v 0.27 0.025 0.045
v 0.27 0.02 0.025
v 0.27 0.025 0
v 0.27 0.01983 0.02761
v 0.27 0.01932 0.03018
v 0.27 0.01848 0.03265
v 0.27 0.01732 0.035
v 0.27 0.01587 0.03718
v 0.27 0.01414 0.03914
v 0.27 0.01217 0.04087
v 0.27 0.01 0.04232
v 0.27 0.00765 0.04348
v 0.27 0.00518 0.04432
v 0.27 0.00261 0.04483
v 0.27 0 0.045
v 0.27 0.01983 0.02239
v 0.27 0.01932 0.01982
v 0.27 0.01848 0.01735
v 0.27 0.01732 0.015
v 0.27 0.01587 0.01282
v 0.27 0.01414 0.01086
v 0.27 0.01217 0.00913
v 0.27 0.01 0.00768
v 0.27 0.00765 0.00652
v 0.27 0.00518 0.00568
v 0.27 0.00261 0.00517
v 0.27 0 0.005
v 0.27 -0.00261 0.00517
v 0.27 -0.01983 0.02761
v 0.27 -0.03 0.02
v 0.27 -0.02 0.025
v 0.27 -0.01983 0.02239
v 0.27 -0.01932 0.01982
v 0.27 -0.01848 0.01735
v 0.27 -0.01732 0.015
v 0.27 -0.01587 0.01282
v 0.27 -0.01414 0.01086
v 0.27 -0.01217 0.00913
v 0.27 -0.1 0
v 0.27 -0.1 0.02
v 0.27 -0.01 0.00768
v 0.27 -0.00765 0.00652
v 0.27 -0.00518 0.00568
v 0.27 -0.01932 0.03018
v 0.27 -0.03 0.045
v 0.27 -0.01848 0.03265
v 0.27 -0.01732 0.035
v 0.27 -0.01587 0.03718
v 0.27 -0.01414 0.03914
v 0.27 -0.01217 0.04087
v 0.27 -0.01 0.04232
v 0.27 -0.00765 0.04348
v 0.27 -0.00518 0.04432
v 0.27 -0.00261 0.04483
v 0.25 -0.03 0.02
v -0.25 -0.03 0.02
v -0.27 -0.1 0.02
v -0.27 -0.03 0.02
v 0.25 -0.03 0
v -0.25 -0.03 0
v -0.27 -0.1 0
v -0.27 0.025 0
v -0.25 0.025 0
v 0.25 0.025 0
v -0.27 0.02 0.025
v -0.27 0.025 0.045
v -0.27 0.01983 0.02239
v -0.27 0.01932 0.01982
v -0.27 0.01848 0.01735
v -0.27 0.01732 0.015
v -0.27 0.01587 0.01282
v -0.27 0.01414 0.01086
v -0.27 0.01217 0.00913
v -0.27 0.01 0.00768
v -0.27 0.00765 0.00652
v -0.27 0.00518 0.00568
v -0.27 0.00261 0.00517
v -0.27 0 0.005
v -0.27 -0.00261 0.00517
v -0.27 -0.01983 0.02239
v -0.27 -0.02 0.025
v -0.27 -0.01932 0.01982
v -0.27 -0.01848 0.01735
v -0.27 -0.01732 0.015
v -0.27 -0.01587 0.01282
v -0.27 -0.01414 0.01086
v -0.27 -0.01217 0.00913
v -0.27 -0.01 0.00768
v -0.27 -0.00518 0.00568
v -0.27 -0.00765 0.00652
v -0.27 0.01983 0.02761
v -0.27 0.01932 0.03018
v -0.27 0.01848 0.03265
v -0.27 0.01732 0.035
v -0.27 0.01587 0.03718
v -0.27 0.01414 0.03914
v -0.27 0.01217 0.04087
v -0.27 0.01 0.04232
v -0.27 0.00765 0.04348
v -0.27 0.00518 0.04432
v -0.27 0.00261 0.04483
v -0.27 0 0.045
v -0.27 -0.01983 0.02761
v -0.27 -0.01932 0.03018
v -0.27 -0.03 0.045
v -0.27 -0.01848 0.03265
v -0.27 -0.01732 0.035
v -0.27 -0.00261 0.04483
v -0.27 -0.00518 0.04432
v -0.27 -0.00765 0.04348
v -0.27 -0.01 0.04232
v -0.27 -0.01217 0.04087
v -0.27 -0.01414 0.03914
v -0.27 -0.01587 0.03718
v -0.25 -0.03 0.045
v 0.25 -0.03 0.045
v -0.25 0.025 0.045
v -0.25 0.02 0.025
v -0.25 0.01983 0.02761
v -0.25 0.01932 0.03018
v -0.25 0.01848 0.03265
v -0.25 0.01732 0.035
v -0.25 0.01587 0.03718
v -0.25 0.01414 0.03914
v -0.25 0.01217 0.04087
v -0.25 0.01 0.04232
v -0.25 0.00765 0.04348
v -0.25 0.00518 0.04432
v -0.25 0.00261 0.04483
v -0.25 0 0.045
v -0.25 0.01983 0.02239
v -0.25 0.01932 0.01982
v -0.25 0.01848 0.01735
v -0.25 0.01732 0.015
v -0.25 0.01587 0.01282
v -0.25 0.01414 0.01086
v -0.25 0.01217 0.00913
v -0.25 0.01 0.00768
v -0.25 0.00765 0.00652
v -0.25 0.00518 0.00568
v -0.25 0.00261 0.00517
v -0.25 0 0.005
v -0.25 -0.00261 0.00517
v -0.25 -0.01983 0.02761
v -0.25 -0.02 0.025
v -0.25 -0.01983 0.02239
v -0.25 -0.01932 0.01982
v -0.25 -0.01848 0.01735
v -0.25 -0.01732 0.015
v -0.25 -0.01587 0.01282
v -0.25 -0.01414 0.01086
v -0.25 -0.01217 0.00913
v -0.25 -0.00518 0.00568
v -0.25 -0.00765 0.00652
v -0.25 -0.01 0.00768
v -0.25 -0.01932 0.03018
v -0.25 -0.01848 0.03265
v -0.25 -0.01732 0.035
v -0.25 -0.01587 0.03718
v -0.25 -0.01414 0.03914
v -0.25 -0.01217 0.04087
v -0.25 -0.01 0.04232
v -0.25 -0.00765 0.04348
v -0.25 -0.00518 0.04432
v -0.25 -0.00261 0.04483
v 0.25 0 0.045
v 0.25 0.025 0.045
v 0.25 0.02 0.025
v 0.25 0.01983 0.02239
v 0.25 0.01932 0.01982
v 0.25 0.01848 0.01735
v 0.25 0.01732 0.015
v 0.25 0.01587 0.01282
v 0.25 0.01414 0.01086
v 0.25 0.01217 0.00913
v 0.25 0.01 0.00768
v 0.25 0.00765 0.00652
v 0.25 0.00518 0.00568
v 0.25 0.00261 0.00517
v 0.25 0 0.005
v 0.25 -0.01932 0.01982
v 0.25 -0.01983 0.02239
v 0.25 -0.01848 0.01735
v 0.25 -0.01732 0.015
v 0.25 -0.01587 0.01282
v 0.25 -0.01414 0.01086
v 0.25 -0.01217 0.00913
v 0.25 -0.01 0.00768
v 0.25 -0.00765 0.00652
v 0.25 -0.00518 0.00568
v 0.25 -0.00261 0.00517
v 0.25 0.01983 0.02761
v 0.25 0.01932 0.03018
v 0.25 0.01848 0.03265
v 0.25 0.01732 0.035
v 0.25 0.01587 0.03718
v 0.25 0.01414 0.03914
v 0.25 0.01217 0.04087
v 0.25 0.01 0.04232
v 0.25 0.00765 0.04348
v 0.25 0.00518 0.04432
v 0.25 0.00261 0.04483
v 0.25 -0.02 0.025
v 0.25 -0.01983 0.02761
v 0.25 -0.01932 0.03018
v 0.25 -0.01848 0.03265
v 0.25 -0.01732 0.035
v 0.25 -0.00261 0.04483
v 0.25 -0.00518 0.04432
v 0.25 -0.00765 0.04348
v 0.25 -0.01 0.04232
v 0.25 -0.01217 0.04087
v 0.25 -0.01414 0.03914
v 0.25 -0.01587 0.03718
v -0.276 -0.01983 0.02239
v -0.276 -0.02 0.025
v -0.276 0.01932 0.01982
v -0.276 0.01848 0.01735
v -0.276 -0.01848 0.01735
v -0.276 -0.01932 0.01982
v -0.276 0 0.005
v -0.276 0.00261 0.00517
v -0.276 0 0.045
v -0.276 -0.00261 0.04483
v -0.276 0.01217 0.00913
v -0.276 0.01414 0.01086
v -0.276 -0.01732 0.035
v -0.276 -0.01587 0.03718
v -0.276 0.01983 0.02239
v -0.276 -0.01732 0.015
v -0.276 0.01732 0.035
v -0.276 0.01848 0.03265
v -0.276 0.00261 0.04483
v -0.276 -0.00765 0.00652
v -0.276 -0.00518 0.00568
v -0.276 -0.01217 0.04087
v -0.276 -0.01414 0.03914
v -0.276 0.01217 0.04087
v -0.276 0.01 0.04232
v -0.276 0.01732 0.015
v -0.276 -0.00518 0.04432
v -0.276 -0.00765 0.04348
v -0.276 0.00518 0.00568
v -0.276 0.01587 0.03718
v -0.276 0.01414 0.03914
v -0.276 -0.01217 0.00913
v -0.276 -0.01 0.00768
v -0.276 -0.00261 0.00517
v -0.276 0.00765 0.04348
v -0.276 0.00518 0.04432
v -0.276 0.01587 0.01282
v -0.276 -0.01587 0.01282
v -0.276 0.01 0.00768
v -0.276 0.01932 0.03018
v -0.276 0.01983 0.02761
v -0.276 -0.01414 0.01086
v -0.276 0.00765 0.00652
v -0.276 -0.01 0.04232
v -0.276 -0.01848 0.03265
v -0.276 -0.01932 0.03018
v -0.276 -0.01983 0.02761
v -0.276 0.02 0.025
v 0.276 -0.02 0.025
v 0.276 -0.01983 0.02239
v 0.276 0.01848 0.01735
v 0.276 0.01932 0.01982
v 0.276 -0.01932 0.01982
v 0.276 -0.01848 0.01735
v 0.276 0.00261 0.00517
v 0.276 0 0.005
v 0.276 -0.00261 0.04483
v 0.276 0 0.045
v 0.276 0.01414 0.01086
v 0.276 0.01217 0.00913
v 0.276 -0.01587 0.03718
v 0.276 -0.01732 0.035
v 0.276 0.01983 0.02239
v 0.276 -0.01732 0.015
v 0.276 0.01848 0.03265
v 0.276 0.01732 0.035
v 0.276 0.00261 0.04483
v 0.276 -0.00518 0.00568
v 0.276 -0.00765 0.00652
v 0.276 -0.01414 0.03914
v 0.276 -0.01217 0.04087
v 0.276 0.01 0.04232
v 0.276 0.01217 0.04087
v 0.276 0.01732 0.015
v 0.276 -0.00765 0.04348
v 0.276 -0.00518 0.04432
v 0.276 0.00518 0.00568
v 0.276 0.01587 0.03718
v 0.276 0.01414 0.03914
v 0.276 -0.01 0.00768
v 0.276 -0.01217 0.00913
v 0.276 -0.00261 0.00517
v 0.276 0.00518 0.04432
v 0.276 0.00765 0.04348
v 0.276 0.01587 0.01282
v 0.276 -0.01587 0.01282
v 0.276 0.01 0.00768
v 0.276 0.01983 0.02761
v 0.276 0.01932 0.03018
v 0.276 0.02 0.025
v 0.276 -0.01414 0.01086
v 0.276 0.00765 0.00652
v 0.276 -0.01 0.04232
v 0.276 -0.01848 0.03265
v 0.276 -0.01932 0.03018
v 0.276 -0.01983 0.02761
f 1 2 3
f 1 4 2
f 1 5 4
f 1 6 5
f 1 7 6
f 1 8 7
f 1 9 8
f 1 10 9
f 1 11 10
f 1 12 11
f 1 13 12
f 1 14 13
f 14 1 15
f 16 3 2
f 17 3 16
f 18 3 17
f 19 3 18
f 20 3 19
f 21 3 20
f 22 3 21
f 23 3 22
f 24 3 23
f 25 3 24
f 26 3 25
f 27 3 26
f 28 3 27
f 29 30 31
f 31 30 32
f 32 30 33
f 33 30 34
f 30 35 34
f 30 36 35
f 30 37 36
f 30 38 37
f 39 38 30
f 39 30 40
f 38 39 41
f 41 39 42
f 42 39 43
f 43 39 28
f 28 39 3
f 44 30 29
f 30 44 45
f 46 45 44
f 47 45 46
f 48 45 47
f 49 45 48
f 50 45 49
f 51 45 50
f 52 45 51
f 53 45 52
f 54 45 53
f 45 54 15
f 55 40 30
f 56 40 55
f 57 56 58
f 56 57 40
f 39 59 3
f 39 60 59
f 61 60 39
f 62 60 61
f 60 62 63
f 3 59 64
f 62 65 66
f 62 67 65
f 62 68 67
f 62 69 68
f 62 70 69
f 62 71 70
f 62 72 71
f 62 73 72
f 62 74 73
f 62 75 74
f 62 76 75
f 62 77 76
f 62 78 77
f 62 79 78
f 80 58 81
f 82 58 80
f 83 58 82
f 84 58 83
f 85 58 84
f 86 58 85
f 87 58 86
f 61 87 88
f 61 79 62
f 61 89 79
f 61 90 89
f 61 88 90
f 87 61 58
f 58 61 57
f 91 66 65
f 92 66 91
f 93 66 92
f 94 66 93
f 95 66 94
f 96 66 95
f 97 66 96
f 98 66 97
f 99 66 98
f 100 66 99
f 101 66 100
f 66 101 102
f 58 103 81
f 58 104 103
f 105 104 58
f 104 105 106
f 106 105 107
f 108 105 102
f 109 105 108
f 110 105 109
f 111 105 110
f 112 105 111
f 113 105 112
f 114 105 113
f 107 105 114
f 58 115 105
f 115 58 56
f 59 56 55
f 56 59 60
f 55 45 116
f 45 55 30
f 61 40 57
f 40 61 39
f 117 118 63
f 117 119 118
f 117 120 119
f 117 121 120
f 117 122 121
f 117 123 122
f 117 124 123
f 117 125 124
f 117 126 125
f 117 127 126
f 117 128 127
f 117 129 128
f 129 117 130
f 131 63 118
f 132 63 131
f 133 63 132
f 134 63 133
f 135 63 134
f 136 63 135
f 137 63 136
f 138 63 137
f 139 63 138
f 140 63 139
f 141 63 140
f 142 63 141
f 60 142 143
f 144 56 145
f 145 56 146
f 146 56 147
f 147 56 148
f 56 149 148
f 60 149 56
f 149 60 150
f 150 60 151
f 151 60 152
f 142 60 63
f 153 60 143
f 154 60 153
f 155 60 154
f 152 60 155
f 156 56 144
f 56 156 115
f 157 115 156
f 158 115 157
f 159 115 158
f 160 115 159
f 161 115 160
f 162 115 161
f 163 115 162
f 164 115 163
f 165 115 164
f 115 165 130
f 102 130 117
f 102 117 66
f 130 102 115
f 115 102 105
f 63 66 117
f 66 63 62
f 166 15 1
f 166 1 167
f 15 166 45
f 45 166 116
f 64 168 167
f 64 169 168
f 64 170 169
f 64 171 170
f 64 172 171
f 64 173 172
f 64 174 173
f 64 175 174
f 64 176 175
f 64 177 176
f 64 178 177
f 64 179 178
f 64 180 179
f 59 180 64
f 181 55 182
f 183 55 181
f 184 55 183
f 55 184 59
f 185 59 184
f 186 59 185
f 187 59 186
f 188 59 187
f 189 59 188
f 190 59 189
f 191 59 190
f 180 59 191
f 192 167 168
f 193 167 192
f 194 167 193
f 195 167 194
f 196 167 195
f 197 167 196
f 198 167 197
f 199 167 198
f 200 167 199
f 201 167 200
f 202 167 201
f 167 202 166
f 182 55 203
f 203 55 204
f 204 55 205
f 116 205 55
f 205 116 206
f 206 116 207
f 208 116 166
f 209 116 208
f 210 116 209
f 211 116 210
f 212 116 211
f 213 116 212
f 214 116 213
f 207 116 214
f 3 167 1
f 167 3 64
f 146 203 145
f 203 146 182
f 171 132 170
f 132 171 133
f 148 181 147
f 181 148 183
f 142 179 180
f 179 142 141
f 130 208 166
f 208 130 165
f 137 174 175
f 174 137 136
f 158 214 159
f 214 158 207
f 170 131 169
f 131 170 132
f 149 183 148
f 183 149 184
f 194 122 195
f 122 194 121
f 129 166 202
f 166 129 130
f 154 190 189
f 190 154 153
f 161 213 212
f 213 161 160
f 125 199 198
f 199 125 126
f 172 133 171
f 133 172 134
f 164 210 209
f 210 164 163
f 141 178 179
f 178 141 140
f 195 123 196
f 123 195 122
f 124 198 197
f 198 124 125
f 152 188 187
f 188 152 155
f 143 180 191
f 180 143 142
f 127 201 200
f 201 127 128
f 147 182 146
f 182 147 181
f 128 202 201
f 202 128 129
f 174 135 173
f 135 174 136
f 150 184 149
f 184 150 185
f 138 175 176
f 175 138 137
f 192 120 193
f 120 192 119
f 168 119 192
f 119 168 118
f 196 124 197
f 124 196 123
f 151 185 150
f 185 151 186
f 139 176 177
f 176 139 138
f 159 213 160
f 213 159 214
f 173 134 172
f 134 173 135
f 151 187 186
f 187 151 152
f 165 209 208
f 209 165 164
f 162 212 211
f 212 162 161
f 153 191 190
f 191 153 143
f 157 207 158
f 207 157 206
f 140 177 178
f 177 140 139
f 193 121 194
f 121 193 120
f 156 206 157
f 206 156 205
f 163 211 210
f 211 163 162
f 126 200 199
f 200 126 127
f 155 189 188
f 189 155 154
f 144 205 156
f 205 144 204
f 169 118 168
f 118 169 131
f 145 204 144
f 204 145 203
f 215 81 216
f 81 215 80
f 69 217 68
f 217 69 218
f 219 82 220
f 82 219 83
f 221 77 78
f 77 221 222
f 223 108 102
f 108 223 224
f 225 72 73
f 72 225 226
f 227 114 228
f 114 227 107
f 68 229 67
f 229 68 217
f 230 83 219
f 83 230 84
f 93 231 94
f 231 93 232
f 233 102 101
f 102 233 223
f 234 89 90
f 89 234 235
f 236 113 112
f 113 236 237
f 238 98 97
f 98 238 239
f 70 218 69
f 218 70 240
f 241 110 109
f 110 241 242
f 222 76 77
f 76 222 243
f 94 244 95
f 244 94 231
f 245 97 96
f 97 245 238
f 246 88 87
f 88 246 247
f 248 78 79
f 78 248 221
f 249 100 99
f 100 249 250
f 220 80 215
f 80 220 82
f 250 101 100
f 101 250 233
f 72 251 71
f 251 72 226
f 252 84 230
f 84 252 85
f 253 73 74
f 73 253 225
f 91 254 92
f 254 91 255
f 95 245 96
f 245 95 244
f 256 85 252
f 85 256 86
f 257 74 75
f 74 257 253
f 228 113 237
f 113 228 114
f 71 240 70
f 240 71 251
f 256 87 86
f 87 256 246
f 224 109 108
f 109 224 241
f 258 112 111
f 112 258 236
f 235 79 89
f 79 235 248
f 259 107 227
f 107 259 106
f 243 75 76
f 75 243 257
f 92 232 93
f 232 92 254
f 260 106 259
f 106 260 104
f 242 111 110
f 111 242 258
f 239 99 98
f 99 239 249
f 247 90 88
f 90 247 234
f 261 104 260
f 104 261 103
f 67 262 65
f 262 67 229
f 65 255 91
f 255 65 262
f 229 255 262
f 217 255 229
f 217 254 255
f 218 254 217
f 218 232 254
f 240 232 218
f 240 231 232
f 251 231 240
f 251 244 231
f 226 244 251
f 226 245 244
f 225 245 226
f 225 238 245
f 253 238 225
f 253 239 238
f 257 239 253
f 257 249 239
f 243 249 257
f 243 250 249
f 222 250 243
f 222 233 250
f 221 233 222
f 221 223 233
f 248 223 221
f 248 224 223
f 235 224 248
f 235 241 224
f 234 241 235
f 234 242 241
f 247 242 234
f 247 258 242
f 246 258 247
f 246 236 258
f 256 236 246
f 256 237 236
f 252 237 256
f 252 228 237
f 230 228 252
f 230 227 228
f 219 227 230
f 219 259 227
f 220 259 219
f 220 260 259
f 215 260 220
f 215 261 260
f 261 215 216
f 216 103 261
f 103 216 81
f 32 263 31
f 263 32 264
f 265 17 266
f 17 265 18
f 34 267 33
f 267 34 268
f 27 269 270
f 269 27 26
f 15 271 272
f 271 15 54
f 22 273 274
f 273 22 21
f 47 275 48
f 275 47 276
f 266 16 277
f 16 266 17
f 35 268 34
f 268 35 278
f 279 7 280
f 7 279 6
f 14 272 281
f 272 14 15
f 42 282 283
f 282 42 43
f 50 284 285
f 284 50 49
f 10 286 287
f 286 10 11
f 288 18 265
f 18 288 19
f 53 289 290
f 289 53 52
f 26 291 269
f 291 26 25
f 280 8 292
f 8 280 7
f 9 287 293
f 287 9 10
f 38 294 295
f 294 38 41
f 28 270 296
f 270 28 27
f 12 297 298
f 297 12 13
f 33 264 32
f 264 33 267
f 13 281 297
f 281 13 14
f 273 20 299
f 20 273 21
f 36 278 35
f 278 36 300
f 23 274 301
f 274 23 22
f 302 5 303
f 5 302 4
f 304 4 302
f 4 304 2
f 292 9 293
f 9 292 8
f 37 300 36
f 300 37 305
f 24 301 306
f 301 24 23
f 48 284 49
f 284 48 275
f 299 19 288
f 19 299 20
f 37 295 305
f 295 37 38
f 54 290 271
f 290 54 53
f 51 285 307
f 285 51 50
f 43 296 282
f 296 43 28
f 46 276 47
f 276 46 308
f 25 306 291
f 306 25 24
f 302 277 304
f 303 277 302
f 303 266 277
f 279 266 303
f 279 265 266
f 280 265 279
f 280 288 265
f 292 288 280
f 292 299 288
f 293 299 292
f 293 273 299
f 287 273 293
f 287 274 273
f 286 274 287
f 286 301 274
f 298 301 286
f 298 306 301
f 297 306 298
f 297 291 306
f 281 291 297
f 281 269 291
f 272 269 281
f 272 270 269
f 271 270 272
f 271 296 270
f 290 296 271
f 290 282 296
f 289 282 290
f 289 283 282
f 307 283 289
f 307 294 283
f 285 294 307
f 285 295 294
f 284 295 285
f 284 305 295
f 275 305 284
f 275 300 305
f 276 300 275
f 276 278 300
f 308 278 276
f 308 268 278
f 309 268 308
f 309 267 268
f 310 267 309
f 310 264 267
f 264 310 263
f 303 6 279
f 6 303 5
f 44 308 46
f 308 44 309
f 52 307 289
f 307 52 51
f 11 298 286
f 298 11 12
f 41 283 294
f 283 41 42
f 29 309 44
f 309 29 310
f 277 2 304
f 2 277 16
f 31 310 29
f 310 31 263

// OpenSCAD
// HingeMesh.CreateBase / HingeMath: pin r=.02, length=.54, height=.025; leaf width=.50; strap depth=.07 thickness=.02; lug height=.045; lug z=-.03.. .025; pin overhang=.006 m, 48 segments.
$fn=48; color("#8E9296") { translate([-.27,-.10,0]) cube([.54,.07,.02]); translate([-.27,-.03,0]) cube([.02,.055,.045]); translate([.25,-.03,0]) cube([.02,.055,.045]); translate([-.27,0,.025]) rotate([0,90,0]) cylinder(r=.02,h=.54); } color("#DC9E33") { translate([-.276,0,.025]) rotate([0,90,0]) cylinder(r=.02,h=.006); translate([.27,0,.025]) rotate([0,90,0]) cylinder(r=.02,h=.006); }
